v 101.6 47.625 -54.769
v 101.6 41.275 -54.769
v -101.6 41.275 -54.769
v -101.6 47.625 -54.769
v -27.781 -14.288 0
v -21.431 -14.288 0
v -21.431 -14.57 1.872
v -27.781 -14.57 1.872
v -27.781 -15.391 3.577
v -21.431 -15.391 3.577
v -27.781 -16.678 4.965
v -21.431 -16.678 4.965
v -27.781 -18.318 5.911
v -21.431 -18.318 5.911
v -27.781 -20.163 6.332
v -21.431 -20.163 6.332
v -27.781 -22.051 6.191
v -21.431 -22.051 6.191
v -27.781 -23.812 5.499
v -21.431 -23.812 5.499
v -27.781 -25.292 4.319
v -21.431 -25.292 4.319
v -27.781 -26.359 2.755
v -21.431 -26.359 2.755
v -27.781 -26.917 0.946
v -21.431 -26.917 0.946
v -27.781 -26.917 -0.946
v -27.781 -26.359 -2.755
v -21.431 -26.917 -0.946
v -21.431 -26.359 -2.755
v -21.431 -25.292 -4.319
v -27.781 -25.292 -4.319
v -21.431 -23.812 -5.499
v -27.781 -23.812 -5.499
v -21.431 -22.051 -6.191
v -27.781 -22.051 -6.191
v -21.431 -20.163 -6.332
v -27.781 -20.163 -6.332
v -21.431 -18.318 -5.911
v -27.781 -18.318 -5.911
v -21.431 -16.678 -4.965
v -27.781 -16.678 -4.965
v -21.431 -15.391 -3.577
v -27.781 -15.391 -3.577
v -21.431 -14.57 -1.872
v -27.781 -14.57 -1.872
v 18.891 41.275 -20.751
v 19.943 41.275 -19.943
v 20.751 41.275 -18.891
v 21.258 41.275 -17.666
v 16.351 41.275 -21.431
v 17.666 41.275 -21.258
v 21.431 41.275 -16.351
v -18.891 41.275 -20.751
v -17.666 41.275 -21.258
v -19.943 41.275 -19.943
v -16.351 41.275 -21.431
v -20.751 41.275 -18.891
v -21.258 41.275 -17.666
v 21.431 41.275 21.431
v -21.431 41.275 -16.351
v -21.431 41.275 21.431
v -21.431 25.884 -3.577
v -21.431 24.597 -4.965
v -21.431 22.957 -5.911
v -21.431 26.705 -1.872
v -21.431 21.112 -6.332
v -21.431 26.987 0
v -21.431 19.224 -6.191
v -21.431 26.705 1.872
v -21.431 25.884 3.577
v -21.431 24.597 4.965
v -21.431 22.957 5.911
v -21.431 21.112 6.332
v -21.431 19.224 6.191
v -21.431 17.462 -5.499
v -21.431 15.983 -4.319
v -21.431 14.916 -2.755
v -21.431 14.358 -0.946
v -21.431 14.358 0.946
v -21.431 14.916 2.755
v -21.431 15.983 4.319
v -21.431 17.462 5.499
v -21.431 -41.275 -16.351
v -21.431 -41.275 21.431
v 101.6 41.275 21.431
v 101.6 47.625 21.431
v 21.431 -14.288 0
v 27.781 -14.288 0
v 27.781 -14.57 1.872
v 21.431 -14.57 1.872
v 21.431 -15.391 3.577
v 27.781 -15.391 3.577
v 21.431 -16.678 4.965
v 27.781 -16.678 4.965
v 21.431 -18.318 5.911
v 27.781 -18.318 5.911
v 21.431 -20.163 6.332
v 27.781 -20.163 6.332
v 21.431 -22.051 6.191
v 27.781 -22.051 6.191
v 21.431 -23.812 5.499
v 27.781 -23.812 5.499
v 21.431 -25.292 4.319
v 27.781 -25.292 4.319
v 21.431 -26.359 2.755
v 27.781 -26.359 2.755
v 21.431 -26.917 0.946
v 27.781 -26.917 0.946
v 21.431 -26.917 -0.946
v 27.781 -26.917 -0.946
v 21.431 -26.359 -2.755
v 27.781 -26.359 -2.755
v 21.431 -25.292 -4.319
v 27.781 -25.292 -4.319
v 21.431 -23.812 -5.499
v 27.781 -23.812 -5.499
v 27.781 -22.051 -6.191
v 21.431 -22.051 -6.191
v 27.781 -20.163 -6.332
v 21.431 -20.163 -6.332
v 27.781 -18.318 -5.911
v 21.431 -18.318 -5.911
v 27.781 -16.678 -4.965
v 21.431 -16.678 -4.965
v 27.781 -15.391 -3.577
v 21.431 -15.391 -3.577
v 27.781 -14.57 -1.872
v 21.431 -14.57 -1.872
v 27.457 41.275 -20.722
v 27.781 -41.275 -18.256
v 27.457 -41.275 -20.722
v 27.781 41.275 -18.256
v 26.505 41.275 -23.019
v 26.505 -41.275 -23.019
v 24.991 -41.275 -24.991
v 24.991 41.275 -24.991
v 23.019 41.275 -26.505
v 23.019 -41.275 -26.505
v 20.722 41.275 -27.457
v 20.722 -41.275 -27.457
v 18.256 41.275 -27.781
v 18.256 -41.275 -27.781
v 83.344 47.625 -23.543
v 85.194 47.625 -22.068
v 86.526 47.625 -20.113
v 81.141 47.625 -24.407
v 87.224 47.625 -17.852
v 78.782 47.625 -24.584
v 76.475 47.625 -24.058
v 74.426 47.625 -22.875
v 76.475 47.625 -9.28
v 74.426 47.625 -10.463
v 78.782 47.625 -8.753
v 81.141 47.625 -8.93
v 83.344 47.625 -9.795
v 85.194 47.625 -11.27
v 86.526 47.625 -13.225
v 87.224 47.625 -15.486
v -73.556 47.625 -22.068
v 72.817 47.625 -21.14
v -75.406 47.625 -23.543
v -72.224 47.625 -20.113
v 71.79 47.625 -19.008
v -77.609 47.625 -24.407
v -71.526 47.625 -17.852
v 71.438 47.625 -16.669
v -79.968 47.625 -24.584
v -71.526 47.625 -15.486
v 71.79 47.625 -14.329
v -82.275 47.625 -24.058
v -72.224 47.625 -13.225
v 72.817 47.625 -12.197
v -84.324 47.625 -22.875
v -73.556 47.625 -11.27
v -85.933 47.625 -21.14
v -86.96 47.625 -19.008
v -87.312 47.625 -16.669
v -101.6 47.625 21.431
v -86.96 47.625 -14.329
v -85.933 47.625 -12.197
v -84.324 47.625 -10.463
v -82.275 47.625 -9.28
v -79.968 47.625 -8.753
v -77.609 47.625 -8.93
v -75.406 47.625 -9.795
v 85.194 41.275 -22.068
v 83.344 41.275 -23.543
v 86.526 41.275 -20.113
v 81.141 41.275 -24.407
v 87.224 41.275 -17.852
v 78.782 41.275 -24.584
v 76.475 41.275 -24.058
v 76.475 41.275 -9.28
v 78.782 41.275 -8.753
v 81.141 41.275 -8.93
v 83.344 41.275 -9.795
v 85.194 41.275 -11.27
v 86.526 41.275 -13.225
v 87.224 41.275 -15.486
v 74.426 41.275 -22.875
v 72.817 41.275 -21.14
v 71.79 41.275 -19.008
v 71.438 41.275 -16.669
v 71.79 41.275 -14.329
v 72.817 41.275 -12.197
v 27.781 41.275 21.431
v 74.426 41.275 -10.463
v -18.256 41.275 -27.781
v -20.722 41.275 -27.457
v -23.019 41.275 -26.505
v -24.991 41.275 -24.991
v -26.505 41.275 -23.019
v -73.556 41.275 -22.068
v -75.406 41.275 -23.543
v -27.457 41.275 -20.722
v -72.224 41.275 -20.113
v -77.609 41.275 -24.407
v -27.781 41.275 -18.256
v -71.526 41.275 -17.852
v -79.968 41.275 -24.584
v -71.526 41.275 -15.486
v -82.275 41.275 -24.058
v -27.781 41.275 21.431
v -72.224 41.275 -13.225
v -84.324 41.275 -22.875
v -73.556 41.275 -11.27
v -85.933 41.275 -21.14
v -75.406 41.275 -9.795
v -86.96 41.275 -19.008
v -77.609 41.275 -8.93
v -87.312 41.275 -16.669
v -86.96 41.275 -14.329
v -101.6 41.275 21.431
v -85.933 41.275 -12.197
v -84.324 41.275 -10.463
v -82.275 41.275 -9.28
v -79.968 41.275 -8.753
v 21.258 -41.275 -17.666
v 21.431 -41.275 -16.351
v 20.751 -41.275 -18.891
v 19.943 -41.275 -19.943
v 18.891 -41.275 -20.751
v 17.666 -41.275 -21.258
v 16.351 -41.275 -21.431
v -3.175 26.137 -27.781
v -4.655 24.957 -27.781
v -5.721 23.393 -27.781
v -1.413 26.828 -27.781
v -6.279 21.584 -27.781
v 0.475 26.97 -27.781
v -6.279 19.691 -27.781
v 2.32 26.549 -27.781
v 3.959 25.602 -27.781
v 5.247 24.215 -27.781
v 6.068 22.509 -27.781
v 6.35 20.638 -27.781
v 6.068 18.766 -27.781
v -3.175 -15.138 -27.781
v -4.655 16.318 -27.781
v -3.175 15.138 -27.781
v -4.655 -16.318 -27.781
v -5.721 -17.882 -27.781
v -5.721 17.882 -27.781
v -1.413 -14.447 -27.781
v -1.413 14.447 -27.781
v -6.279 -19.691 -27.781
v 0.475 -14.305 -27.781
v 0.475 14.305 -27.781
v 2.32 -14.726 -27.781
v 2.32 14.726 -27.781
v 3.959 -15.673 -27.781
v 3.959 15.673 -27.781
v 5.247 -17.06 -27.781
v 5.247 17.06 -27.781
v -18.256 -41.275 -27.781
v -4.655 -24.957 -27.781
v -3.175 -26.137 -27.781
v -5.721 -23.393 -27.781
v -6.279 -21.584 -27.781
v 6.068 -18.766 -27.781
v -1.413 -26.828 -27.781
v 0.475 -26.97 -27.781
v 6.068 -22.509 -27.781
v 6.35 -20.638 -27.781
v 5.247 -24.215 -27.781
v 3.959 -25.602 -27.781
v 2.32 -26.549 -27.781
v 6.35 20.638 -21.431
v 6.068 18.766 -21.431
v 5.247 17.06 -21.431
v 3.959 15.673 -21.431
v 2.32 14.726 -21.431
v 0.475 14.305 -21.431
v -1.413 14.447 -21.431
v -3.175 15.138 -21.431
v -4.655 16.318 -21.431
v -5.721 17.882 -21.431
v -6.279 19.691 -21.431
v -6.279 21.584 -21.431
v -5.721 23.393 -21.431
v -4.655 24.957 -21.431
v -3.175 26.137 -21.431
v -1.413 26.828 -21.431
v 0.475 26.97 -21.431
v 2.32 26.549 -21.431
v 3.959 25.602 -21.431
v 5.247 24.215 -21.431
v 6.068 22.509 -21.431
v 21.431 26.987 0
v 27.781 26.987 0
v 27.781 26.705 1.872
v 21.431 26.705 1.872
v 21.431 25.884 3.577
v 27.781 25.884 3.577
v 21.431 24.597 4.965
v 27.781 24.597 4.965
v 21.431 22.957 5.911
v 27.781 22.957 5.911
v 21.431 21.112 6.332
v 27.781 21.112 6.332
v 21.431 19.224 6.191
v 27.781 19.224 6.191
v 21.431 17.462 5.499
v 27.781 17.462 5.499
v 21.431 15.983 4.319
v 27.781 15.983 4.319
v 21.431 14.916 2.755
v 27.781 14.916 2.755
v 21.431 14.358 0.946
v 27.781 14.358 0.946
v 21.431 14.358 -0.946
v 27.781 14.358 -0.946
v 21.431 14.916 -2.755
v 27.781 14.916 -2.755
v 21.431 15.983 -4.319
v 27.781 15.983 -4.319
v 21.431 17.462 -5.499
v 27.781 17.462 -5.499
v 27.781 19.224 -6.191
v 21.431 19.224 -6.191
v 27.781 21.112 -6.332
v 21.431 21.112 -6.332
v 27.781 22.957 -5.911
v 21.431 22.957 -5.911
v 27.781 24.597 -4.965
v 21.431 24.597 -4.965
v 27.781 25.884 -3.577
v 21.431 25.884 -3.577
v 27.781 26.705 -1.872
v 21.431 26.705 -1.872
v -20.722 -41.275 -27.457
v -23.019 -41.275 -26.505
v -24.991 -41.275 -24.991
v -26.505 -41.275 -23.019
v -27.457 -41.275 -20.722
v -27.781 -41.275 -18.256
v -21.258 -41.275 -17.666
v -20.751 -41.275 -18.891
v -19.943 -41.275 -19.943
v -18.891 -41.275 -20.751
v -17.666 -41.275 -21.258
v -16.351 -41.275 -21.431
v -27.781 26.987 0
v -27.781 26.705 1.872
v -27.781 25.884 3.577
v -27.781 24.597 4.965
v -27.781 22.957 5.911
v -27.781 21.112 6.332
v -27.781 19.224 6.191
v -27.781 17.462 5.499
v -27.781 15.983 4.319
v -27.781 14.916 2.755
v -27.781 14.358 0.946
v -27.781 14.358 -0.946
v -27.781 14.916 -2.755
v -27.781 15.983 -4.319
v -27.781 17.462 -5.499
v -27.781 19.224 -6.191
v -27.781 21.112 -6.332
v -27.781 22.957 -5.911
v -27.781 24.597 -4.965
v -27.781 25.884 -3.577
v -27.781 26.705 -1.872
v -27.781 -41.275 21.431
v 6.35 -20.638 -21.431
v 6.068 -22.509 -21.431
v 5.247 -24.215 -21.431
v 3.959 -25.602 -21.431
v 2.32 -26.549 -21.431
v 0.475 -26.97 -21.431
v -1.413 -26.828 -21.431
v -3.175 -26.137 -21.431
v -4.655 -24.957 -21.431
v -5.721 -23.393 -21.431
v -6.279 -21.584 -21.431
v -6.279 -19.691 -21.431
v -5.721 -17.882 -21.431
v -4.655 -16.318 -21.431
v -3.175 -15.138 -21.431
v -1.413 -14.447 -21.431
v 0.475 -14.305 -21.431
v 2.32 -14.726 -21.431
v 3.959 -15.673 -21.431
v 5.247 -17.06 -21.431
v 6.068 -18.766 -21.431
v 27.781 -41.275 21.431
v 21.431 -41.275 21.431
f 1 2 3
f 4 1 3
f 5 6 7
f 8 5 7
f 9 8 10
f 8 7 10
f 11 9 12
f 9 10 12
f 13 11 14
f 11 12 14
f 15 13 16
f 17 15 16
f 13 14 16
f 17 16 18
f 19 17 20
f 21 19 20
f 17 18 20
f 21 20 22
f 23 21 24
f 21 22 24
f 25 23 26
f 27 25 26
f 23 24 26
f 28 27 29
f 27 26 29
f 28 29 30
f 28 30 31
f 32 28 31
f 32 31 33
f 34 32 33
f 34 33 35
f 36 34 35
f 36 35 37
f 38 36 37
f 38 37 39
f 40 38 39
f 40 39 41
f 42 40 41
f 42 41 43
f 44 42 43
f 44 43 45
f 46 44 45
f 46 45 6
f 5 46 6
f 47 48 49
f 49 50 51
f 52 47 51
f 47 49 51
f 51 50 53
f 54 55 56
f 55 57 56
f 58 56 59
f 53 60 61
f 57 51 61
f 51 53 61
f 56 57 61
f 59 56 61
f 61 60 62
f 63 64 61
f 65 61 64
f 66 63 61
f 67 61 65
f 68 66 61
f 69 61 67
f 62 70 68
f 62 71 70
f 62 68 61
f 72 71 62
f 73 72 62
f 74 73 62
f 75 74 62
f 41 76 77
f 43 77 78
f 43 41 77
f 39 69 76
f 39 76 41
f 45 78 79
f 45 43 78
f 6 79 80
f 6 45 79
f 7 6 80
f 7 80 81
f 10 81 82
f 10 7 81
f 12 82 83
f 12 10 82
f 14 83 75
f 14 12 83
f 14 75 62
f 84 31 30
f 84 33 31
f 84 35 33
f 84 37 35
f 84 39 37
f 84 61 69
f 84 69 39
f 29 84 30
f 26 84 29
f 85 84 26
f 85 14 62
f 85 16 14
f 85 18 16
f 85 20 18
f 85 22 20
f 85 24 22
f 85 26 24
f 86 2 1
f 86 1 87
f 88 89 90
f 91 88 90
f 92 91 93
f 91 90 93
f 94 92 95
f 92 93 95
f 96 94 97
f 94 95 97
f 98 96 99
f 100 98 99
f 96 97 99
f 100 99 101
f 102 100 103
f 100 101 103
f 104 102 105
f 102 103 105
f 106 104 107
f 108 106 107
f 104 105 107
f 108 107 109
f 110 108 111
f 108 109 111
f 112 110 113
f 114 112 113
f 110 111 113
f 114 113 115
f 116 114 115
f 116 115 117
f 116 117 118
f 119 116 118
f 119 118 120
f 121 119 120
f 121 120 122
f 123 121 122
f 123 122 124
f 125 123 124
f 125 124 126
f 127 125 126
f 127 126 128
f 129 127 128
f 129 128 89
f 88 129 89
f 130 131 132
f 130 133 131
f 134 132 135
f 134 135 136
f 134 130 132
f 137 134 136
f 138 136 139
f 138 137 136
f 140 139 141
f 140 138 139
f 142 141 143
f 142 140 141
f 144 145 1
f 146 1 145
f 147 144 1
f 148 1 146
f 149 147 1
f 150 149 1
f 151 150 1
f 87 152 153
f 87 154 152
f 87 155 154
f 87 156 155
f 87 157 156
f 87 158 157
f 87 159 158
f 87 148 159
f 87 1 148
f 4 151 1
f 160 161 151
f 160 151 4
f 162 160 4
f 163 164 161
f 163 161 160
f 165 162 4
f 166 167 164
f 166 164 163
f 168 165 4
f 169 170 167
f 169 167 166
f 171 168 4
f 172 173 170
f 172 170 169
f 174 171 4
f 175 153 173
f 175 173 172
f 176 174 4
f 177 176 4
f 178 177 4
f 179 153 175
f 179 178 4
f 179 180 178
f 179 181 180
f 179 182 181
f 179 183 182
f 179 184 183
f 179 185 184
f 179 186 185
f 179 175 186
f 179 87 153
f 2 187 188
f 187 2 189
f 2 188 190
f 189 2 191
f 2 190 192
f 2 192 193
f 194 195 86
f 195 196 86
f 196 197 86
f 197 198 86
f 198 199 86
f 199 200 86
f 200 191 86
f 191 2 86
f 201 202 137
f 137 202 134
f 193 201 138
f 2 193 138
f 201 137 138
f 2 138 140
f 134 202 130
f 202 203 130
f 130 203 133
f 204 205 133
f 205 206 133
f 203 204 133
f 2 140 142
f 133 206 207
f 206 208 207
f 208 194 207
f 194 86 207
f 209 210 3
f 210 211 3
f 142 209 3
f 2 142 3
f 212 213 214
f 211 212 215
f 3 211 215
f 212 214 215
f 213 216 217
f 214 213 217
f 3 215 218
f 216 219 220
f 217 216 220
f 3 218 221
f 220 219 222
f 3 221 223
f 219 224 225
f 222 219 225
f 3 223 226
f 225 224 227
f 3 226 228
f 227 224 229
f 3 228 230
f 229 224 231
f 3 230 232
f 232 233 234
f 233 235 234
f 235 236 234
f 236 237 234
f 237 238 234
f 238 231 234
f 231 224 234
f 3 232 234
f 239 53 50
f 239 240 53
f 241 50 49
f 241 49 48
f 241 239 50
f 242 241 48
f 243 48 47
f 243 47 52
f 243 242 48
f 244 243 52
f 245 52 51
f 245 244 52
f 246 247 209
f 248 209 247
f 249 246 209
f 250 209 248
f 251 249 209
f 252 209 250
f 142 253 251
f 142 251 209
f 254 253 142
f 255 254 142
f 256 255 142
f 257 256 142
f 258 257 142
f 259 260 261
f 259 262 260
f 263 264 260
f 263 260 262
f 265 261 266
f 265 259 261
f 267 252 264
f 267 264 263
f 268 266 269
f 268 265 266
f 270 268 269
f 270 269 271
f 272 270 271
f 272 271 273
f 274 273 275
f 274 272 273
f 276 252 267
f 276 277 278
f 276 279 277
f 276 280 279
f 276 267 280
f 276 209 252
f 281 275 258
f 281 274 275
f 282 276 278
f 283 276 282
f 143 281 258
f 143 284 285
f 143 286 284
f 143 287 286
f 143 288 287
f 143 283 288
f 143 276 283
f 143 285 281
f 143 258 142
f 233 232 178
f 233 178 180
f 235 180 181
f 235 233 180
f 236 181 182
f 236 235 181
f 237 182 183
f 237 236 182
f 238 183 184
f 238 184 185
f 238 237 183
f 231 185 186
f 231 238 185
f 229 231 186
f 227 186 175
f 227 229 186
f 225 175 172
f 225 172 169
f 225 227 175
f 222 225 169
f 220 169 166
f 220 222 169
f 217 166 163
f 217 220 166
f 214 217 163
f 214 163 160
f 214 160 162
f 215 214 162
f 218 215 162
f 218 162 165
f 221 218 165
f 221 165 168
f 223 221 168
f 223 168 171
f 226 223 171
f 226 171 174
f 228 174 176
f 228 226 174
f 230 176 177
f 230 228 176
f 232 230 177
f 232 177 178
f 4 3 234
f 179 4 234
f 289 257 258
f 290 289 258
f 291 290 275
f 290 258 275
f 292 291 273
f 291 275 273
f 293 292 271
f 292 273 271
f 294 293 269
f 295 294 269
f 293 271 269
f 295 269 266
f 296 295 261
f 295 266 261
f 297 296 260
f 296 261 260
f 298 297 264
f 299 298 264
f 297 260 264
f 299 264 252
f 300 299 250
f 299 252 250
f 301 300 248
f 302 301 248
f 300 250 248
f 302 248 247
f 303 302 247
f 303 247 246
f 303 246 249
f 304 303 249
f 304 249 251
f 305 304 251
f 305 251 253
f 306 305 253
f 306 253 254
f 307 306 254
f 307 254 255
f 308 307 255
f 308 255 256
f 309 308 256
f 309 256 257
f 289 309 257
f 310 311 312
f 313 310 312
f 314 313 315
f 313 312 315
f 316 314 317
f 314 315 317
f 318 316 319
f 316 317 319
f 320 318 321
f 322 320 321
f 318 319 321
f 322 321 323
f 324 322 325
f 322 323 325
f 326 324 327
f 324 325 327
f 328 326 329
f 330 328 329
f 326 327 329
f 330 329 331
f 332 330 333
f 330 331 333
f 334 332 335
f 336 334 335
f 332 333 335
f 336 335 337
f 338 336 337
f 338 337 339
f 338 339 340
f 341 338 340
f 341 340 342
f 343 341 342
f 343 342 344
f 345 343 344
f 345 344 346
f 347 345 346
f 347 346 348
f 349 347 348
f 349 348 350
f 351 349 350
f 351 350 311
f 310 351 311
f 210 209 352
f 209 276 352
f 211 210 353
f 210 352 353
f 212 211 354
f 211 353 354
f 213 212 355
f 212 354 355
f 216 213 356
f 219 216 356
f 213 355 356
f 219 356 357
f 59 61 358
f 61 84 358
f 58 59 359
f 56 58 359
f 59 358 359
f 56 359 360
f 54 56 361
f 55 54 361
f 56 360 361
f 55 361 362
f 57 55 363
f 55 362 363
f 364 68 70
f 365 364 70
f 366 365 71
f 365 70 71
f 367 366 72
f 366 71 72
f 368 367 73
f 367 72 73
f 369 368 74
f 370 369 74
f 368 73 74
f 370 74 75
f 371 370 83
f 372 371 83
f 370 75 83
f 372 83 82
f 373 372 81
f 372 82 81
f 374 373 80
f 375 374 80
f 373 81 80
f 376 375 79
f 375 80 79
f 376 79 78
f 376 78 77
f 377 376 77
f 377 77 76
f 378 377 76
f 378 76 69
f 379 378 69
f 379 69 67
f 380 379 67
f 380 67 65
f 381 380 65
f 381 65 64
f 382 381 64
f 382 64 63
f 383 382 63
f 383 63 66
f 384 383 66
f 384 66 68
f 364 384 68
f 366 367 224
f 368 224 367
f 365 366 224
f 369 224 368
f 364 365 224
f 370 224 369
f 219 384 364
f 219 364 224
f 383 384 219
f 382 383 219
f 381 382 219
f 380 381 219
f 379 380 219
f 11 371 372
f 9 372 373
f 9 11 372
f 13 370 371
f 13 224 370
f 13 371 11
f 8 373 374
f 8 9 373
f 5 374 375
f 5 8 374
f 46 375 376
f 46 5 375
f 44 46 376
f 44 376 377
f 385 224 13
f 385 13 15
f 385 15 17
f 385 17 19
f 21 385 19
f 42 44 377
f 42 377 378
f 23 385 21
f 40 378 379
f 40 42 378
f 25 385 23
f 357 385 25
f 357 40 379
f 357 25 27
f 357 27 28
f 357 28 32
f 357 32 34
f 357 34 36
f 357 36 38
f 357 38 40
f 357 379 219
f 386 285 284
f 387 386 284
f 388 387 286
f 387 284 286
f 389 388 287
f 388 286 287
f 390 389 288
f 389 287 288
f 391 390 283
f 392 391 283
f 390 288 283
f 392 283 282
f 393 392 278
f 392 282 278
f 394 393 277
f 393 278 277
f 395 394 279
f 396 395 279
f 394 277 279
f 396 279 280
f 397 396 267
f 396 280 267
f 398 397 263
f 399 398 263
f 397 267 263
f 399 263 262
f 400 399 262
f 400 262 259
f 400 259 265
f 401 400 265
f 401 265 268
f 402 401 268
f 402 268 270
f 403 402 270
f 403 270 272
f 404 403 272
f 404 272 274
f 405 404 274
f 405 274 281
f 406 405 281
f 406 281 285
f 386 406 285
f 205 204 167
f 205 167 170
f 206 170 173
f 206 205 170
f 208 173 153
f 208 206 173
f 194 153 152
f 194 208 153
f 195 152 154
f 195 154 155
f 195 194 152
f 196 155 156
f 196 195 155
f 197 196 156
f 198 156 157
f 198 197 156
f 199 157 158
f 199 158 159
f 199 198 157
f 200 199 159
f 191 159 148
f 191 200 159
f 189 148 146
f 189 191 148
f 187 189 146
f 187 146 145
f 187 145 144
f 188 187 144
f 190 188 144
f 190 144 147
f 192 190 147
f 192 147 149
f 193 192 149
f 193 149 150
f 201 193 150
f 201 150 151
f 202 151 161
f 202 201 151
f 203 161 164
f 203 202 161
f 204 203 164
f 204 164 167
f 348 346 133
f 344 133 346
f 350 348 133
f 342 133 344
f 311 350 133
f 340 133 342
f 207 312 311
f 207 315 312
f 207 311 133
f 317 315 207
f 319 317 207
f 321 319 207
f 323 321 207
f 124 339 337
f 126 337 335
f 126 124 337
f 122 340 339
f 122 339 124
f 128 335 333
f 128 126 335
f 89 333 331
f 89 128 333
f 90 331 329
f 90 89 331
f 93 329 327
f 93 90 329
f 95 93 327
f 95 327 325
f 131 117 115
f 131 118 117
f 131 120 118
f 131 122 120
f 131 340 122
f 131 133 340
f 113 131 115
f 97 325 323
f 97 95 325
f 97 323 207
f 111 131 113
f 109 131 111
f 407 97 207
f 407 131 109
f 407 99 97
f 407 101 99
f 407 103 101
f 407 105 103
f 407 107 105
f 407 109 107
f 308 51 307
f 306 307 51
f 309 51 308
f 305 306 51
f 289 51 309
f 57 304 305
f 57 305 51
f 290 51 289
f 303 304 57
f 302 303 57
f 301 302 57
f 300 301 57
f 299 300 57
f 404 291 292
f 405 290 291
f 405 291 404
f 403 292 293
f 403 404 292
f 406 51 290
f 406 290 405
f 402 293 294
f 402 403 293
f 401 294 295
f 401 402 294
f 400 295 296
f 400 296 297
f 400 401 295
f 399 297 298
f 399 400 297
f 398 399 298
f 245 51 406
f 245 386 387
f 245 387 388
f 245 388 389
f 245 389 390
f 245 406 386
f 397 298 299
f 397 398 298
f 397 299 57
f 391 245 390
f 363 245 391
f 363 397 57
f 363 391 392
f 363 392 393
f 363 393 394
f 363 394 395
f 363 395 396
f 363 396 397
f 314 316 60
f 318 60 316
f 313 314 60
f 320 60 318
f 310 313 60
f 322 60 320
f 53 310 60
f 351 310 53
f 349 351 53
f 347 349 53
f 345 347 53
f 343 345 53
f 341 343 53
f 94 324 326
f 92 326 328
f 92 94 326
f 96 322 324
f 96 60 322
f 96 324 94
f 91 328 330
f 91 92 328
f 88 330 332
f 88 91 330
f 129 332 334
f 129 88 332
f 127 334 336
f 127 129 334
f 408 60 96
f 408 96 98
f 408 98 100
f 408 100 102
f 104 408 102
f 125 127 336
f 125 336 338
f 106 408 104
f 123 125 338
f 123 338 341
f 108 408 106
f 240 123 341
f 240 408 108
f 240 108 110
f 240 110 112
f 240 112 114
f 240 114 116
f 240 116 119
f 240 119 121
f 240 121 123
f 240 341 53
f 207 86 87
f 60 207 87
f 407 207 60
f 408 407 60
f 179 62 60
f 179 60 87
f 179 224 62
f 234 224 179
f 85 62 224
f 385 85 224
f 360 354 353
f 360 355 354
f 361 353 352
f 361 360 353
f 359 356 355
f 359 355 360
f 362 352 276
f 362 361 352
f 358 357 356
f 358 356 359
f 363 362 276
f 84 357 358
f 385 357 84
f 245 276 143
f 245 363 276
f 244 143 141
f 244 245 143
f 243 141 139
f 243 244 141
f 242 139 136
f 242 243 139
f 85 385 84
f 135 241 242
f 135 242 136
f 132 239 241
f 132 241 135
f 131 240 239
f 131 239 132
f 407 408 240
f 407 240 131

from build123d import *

# Parameters (mm, degrees)
F1_DEPTH = 41.275
F2_R     = 5.08
F3_R     = 9.525
F4_R     = 6.35
F5_DEPTH = 55.5635
F6_R     = 6.35
F7_DEPTH = 25.4
F8_W     = 203.2
F8_H     = 76.2
F8_R     = 7.9375
F9_DEPTH = 6.35


with BuildPart() as f1:
    # F0 (on Front) → F1 (new body, symmetric)
    with BuildSketch(Plane.XZ):
        Polygon((21.43125, 21.43125), (21.43125, -21.43125), (-21.43125, -21.43125), (-21.43125, 21.43125), (-27.78125, 21.43125), (-27.78125, -21.43125), (-27.78125, -27.78125), (-21.43125, -27.78125), (21.43125, -27.78125), (27.78125, -27.78125), (27.78125, -21.43125), (27.78125, 21.43125), align=None)
    extrude(amount=F1_DEPTH, both=True)

    # F2
    f2_edges = [f1.edges().sort_by_distance(p)[0] for p in [
        (-21.43125, 0, -21.43125),
        (21.43125, 0, -21.43125),
    ]]
    fillet(f2_edges, radius=F2_R)

    # F3
    f3_edges = [f1.edges().sort_by_distance(p)[0] for p in [
        (-27.78125, 0, -27.78125),
        (27.78125, 0, -27.78125),
    ]]
    fillet(f3_edges, radius=F3_R)

    # F4 (on face) → F5 (cut, through all)
    with BuildSketch(Plane.YZ.offset(27.78125)):
        with Locations((-20.6375, 0)):
            Circle(F4_R)
        with Locations((20.6375, 0)):
            Circle(F4_R)
    extrude(amount=-F5_DEPTH, mode=Mode.SUBTRACT)

    # F6 (on face) → F7 (cut)
    with BuildSketch(Plane(origin=(0, 0, -27.78125), x_dir=(1, 0, 0), z_dir=(0, 0, -1))):
        with Locations((0, 20.6375)):
            Circle(F6_R)
        with Locations((0, -20.6375)):
            Circle(F6_R)
    extrude(amount=-F7_DEPTH, mode=Mode.SUBTRACT)

    # F8 (on face) → F9 (join)
    with BuildSketch(Plane(origin=(0, 41.275, 0), x_dir=(-1, 0, 0), z_dir=(0, 1, 0))):
        with Locations((0, -16.66875)):
            Rectangle(F8_W, F8_H)
        with Locations((-79.375, -16.66875)):
            Circle(F8_R, mode=Mode.SUBTRACT)
        with Locations((79.375, -16.66875)):
            Circle(F8_R, mode=Mode.SUBTRACT)
    extrude(amount=F9_DEPTH)


solid = f1.part
